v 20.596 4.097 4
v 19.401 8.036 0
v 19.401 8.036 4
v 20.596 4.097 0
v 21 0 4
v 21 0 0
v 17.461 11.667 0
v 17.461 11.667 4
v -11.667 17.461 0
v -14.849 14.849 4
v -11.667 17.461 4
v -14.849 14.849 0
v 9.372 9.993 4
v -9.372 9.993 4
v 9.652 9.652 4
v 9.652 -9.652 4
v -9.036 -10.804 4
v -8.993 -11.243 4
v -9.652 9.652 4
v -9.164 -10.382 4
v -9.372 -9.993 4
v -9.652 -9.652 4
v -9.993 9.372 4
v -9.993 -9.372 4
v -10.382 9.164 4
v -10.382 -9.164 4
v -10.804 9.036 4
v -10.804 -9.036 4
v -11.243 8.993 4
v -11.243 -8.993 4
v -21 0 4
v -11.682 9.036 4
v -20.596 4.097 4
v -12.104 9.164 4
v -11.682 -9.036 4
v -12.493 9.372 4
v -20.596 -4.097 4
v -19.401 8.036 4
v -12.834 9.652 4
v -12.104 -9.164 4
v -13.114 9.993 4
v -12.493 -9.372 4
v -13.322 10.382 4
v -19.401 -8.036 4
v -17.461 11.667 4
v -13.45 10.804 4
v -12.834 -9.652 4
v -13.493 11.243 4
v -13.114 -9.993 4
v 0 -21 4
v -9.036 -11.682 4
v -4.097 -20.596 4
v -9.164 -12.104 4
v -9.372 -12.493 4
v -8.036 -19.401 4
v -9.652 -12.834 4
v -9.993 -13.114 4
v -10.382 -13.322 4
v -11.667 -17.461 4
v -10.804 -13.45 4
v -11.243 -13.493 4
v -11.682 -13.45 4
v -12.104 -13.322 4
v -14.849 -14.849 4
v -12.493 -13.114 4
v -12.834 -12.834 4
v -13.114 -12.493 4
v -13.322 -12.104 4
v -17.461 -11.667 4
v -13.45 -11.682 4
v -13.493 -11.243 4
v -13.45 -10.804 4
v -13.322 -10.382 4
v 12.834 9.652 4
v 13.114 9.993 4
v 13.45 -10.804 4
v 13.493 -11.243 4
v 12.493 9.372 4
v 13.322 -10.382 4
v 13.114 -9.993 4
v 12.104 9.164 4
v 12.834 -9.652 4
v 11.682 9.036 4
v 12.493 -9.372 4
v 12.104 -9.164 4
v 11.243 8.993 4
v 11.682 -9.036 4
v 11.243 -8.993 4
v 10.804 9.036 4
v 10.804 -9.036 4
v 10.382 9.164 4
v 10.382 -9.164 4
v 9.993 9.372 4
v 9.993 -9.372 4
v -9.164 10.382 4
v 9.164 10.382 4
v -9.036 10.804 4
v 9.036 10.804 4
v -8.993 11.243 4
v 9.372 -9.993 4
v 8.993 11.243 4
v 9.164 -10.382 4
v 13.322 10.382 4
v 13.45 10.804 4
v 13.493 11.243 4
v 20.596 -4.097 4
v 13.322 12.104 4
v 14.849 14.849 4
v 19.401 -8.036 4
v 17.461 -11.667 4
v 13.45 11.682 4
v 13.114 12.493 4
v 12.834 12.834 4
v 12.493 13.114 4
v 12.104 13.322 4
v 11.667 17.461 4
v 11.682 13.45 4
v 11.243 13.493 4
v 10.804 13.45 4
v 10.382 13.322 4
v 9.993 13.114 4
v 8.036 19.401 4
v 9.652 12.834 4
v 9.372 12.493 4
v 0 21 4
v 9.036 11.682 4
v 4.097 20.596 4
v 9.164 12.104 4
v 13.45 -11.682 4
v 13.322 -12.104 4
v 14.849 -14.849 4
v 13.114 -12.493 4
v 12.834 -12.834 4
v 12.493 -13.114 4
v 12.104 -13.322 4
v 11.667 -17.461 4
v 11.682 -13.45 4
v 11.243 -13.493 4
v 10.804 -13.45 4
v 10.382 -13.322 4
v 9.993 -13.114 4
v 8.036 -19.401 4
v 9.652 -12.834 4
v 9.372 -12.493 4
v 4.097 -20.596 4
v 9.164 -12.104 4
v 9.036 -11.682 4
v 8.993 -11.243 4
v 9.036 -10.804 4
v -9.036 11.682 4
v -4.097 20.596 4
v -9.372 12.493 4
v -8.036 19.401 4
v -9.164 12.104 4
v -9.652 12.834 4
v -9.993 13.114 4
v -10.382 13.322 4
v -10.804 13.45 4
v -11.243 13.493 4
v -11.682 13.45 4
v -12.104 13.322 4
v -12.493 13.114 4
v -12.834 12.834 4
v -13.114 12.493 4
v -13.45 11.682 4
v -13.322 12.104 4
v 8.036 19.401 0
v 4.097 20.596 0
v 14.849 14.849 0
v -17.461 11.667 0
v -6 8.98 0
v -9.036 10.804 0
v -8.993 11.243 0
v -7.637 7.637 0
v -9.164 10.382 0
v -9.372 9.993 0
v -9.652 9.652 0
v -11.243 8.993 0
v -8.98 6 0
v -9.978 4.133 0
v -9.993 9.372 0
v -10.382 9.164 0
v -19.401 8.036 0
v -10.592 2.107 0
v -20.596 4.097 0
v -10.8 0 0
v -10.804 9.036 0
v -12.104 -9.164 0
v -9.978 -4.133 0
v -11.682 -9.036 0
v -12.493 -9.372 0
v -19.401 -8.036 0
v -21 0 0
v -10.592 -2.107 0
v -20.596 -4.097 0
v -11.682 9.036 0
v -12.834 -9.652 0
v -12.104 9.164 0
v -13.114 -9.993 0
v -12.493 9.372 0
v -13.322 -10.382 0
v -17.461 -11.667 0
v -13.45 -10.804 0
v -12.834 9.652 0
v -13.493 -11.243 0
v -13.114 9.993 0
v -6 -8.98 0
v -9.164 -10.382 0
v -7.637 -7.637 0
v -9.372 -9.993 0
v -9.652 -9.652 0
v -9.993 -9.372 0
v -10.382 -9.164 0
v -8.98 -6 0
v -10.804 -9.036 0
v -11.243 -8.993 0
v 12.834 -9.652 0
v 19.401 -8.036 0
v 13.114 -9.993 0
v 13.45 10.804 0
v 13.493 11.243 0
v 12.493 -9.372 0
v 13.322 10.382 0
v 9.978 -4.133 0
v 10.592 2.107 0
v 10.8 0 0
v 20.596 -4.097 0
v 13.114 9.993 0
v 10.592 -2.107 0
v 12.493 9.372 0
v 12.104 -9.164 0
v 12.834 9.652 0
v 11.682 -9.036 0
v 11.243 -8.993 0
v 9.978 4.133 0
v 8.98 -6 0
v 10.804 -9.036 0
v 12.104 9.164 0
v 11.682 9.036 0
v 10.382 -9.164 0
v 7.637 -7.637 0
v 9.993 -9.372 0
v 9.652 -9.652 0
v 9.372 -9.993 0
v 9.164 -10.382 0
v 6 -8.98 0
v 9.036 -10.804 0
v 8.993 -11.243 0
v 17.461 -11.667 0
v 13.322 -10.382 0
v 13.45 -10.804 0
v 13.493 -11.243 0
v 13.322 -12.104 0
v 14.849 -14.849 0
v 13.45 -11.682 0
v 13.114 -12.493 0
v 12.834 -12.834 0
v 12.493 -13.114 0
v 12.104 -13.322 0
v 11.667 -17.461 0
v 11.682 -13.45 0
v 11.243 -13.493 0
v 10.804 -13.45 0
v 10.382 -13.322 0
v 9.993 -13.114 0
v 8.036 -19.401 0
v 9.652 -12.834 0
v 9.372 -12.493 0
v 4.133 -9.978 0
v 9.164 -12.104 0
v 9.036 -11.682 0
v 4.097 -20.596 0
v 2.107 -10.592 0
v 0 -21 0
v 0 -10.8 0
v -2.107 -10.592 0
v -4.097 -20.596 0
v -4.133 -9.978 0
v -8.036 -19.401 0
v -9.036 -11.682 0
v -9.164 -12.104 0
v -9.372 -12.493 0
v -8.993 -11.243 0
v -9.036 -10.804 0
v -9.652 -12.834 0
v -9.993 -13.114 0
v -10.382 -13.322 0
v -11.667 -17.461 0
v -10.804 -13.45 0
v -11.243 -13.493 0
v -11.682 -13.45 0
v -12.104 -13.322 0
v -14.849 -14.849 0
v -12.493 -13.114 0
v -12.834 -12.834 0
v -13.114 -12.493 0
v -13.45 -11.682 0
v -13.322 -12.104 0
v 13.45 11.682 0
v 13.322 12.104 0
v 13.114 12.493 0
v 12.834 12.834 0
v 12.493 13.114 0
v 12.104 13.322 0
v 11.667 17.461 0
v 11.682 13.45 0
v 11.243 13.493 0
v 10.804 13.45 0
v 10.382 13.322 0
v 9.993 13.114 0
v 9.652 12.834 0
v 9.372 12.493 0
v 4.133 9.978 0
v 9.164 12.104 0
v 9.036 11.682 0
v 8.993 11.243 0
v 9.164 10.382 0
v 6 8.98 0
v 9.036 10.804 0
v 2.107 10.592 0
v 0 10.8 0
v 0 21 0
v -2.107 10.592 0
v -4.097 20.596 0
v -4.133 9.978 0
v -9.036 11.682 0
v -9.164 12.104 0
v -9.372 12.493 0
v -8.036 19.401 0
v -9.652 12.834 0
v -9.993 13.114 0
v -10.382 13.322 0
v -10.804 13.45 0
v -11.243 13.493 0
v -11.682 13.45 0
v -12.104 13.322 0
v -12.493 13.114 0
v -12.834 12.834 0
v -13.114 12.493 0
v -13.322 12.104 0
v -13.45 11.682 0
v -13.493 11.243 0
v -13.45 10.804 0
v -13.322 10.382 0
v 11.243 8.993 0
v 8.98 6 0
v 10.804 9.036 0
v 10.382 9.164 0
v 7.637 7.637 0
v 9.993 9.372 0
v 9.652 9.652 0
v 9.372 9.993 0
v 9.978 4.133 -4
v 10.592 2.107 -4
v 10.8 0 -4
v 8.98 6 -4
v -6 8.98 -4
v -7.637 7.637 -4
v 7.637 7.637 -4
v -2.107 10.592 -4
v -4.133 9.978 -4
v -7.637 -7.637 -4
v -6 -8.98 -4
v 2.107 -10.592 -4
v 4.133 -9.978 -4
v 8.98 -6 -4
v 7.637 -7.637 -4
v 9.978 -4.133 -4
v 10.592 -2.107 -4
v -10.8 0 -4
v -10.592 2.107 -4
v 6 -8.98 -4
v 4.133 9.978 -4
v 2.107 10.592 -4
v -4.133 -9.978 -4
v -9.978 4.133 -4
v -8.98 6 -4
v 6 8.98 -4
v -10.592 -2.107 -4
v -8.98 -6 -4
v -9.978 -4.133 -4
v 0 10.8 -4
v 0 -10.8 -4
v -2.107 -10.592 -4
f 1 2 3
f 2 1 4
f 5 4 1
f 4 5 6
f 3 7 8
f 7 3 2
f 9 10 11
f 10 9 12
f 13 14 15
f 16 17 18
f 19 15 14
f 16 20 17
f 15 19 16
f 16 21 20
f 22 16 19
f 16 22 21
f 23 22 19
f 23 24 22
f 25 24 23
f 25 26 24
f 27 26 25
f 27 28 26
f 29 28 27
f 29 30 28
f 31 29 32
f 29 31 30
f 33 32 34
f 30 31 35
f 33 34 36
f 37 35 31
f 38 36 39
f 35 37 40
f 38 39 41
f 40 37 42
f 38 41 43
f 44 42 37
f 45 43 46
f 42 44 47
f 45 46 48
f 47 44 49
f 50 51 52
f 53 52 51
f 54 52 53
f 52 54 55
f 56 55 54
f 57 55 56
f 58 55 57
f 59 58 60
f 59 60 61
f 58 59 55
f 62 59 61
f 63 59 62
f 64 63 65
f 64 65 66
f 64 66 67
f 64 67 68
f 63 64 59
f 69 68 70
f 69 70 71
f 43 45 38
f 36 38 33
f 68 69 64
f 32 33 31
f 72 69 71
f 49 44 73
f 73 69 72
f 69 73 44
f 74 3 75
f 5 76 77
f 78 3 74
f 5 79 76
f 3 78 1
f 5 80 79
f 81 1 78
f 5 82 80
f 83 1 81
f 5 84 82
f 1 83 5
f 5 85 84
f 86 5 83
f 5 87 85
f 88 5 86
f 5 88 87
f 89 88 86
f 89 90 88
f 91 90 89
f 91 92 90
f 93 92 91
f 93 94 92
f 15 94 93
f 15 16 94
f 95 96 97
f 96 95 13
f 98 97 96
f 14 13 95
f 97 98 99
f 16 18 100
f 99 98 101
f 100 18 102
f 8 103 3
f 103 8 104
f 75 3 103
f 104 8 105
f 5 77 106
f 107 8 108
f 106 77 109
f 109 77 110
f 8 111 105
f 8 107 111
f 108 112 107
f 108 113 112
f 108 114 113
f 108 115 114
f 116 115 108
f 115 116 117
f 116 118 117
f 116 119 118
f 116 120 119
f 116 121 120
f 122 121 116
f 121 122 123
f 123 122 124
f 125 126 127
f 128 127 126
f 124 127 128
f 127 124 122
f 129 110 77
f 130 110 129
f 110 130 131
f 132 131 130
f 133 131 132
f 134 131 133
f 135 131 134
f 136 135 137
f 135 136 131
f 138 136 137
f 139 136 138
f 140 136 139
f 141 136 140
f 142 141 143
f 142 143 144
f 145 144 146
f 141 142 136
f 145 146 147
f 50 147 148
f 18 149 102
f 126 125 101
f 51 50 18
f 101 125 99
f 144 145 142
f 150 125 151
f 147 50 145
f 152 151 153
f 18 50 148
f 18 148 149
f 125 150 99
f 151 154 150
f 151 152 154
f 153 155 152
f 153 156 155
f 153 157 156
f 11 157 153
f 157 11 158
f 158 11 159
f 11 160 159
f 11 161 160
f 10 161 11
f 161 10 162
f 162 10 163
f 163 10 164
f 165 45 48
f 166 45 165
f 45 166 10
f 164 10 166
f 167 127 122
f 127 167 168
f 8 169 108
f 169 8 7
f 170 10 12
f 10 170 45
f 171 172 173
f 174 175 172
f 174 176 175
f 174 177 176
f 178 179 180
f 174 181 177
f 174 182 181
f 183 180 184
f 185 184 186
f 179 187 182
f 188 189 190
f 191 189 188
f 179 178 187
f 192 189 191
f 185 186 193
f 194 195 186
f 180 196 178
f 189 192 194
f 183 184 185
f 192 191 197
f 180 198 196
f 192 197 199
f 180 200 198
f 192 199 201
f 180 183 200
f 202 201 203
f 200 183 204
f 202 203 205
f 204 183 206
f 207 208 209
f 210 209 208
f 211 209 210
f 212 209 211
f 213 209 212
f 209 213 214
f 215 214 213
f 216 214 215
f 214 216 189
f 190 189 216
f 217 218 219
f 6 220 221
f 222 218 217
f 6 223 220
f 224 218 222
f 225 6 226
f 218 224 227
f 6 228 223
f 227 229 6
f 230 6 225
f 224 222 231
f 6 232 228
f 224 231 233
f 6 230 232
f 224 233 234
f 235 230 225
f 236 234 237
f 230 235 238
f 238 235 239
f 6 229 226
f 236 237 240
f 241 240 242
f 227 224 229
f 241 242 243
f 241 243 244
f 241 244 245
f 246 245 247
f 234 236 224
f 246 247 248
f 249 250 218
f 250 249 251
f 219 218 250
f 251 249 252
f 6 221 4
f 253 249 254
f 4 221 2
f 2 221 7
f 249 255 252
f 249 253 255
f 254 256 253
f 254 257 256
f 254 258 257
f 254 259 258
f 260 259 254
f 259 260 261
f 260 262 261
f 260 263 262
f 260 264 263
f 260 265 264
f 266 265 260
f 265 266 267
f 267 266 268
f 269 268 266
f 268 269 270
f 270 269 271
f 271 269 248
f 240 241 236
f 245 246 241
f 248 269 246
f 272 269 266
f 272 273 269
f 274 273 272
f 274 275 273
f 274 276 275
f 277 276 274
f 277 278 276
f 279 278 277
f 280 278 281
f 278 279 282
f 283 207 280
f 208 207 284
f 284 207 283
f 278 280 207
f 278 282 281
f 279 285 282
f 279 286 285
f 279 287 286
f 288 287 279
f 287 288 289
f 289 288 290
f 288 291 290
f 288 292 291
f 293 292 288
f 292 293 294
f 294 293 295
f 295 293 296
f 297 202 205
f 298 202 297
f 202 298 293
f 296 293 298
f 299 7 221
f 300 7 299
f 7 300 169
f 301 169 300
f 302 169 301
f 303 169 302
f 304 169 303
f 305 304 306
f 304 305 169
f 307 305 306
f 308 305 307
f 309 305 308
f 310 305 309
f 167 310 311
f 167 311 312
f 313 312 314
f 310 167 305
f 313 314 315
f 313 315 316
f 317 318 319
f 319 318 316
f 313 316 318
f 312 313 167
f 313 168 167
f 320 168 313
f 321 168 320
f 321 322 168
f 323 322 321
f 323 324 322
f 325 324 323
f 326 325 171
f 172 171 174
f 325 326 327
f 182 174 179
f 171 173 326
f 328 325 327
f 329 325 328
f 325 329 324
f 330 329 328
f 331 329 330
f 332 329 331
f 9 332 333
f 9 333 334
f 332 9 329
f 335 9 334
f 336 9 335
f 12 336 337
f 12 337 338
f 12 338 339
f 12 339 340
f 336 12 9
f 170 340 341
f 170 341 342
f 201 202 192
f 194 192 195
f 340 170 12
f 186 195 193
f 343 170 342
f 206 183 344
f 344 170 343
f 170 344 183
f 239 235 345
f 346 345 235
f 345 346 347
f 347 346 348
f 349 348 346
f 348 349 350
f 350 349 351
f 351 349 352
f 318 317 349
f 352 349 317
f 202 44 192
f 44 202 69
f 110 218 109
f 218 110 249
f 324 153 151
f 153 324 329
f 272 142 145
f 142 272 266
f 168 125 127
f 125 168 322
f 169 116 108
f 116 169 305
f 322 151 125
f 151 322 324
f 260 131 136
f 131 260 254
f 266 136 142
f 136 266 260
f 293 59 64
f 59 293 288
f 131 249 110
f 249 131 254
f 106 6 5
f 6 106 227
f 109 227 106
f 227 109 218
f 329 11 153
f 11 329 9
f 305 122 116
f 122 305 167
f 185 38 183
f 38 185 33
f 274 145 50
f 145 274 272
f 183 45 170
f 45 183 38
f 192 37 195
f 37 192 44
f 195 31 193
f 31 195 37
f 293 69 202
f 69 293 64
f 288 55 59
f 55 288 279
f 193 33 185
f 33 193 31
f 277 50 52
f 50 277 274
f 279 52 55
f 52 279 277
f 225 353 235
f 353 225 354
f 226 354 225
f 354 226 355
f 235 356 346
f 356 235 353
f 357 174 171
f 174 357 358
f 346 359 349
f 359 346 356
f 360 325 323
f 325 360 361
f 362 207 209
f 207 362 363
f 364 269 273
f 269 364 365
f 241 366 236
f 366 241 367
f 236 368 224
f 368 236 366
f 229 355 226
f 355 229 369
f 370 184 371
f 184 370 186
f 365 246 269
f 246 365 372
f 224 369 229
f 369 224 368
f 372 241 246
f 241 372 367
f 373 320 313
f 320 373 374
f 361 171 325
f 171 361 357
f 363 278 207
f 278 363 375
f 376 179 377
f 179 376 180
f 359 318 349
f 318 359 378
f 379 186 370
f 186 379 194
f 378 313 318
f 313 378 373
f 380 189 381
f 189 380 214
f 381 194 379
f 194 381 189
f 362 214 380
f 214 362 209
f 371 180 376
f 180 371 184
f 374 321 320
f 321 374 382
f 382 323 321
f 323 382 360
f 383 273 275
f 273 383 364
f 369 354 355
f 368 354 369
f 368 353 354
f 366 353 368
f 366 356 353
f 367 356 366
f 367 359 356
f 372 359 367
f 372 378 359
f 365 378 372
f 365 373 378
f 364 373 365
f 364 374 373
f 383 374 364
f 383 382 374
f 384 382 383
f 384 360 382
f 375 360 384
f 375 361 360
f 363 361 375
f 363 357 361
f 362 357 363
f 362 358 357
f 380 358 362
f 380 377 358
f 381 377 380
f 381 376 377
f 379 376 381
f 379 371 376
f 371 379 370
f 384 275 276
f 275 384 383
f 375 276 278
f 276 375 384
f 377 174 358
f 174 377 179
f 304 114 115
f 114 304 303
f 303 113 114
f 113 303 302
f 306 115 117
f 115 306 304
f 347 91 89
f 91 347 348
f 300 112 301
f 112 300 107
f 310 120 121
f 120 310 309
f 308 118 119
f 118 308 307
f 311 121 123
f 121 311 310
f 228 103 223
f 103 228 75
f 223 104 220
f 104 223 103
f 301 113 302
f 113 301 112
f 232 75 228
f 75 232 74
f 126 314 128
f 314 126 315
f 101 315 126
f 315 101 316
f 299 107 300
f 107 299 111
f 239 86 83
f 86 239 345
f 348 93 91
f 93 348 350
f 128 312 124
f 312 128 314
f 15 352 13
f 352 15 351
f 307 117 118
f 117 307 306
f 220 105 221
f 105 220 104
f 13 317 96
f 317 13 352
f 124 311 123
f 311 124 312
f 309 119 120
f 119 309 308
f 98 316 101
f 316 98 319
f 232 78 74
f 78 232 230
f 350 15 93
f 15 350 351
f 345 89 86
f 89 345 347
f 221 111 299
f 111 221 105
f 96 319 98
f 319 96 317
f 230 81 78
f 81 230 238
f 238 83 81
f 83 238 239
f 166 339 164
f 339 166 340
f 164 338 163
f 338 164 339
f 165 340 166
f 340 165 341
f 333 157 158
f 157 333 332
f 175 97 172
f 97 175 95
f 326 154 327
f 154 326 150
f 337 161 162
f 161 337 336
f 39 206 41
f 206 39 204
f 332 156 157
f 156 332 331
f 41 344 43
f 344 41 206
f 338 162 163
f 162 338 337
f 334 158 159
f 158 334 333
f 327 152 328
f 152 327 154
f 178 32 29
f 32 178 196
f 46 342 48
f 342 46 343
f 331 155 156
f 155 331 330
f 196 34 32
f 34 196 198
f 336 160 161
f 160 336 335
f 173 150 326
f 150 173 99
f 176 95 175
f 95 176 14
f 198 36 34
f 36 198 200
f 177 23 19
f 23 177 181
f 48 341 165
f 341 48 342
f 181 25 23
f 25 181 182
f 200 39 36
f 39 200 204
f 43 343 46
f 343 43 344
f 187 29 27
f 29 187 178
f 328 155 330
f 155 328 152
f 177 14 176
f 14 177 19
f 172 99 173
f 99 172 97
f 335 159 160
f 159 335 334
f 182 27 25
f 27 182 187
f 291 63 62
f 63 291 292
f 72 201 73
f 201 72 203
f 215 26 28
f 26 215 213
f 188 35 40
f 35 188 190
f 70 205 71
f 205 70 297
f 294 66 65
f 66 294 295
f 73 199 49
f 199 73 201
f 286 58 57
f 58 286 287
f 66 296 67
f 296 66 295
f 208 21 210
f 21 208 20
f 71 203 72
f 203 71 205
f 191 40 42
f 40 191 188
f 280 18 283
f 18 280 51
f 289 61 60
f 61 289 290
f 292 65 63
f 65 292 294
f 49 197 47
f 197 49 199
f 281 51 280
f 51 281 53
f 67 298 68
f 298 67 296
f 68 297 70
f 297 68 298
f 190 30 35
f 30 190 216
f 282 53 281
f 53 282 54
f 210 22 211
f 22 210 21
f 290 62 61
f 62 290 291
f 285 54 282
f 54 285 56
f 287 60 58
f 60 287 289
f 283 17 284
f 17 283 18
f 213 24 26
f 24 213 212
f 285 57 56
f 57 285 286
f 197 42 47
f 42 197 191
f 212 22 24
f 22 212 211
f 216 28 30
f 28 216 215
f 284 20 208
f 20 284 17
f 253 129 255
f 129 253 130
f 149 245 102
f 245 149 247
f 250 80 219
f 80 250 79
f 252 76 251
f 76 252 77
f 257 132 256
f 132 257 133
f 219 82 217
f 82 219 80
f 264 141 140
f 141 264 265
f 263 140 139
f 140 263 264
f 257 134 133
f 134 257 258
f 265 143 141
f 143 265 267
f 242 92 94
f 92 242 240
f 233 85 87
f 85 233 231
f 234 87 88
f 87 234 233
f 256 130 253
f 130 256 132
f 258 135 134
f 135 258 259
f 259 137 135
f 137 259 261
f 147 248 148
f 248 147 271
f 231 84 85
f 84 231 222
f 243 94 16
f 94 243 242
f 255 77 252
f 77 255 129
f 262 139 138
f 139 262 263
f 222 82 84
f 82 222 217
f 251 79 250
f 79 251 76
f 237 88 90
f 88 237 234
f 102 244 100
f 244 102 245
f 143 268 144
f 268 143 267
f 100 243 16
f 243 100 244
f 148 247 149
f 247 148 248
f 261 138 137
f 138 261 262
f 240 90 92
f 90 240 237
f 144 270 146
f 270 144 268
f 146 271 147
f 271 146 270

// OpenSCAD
$fn = 32;

// ----------------------------------------------------------------------
// Retaining cap: 608 cover, 42 mm, spigot 21.6 mm
// ----------------------------------------------------------------------

// --- parameters (mm) ---
cover_d = 42;             // cover diameter
cover_t = 4;              // cover thickness
spigot_d = 21.6;          // spigot that enters the housing
spigot_h = 4;             // spigot height
bolt_d = 4.5;             // bolt clearance
bolt_r = 15.9;            // bolt circle radius

module cover() {
  cylinder(h = cover_t, d = cover_d);
}

module spigot() {
  /* sunk 1 mm into the cover; the spigot sets the overall height */
  translate([0, 0, -spigot_h]) cylinder(h = spigot_h + 1, d = spigot_d);
}

difference() {
  union() {
    cover();
    spigot();
  }
  for (i = [0 : 3]) rotate([0, 0, 45 + i * 90]) translate([bolt_r, 0, -spigot_h - 1])
    cylinder(h = spigot_h + cover_t + 2, d = bolt_d);
}
